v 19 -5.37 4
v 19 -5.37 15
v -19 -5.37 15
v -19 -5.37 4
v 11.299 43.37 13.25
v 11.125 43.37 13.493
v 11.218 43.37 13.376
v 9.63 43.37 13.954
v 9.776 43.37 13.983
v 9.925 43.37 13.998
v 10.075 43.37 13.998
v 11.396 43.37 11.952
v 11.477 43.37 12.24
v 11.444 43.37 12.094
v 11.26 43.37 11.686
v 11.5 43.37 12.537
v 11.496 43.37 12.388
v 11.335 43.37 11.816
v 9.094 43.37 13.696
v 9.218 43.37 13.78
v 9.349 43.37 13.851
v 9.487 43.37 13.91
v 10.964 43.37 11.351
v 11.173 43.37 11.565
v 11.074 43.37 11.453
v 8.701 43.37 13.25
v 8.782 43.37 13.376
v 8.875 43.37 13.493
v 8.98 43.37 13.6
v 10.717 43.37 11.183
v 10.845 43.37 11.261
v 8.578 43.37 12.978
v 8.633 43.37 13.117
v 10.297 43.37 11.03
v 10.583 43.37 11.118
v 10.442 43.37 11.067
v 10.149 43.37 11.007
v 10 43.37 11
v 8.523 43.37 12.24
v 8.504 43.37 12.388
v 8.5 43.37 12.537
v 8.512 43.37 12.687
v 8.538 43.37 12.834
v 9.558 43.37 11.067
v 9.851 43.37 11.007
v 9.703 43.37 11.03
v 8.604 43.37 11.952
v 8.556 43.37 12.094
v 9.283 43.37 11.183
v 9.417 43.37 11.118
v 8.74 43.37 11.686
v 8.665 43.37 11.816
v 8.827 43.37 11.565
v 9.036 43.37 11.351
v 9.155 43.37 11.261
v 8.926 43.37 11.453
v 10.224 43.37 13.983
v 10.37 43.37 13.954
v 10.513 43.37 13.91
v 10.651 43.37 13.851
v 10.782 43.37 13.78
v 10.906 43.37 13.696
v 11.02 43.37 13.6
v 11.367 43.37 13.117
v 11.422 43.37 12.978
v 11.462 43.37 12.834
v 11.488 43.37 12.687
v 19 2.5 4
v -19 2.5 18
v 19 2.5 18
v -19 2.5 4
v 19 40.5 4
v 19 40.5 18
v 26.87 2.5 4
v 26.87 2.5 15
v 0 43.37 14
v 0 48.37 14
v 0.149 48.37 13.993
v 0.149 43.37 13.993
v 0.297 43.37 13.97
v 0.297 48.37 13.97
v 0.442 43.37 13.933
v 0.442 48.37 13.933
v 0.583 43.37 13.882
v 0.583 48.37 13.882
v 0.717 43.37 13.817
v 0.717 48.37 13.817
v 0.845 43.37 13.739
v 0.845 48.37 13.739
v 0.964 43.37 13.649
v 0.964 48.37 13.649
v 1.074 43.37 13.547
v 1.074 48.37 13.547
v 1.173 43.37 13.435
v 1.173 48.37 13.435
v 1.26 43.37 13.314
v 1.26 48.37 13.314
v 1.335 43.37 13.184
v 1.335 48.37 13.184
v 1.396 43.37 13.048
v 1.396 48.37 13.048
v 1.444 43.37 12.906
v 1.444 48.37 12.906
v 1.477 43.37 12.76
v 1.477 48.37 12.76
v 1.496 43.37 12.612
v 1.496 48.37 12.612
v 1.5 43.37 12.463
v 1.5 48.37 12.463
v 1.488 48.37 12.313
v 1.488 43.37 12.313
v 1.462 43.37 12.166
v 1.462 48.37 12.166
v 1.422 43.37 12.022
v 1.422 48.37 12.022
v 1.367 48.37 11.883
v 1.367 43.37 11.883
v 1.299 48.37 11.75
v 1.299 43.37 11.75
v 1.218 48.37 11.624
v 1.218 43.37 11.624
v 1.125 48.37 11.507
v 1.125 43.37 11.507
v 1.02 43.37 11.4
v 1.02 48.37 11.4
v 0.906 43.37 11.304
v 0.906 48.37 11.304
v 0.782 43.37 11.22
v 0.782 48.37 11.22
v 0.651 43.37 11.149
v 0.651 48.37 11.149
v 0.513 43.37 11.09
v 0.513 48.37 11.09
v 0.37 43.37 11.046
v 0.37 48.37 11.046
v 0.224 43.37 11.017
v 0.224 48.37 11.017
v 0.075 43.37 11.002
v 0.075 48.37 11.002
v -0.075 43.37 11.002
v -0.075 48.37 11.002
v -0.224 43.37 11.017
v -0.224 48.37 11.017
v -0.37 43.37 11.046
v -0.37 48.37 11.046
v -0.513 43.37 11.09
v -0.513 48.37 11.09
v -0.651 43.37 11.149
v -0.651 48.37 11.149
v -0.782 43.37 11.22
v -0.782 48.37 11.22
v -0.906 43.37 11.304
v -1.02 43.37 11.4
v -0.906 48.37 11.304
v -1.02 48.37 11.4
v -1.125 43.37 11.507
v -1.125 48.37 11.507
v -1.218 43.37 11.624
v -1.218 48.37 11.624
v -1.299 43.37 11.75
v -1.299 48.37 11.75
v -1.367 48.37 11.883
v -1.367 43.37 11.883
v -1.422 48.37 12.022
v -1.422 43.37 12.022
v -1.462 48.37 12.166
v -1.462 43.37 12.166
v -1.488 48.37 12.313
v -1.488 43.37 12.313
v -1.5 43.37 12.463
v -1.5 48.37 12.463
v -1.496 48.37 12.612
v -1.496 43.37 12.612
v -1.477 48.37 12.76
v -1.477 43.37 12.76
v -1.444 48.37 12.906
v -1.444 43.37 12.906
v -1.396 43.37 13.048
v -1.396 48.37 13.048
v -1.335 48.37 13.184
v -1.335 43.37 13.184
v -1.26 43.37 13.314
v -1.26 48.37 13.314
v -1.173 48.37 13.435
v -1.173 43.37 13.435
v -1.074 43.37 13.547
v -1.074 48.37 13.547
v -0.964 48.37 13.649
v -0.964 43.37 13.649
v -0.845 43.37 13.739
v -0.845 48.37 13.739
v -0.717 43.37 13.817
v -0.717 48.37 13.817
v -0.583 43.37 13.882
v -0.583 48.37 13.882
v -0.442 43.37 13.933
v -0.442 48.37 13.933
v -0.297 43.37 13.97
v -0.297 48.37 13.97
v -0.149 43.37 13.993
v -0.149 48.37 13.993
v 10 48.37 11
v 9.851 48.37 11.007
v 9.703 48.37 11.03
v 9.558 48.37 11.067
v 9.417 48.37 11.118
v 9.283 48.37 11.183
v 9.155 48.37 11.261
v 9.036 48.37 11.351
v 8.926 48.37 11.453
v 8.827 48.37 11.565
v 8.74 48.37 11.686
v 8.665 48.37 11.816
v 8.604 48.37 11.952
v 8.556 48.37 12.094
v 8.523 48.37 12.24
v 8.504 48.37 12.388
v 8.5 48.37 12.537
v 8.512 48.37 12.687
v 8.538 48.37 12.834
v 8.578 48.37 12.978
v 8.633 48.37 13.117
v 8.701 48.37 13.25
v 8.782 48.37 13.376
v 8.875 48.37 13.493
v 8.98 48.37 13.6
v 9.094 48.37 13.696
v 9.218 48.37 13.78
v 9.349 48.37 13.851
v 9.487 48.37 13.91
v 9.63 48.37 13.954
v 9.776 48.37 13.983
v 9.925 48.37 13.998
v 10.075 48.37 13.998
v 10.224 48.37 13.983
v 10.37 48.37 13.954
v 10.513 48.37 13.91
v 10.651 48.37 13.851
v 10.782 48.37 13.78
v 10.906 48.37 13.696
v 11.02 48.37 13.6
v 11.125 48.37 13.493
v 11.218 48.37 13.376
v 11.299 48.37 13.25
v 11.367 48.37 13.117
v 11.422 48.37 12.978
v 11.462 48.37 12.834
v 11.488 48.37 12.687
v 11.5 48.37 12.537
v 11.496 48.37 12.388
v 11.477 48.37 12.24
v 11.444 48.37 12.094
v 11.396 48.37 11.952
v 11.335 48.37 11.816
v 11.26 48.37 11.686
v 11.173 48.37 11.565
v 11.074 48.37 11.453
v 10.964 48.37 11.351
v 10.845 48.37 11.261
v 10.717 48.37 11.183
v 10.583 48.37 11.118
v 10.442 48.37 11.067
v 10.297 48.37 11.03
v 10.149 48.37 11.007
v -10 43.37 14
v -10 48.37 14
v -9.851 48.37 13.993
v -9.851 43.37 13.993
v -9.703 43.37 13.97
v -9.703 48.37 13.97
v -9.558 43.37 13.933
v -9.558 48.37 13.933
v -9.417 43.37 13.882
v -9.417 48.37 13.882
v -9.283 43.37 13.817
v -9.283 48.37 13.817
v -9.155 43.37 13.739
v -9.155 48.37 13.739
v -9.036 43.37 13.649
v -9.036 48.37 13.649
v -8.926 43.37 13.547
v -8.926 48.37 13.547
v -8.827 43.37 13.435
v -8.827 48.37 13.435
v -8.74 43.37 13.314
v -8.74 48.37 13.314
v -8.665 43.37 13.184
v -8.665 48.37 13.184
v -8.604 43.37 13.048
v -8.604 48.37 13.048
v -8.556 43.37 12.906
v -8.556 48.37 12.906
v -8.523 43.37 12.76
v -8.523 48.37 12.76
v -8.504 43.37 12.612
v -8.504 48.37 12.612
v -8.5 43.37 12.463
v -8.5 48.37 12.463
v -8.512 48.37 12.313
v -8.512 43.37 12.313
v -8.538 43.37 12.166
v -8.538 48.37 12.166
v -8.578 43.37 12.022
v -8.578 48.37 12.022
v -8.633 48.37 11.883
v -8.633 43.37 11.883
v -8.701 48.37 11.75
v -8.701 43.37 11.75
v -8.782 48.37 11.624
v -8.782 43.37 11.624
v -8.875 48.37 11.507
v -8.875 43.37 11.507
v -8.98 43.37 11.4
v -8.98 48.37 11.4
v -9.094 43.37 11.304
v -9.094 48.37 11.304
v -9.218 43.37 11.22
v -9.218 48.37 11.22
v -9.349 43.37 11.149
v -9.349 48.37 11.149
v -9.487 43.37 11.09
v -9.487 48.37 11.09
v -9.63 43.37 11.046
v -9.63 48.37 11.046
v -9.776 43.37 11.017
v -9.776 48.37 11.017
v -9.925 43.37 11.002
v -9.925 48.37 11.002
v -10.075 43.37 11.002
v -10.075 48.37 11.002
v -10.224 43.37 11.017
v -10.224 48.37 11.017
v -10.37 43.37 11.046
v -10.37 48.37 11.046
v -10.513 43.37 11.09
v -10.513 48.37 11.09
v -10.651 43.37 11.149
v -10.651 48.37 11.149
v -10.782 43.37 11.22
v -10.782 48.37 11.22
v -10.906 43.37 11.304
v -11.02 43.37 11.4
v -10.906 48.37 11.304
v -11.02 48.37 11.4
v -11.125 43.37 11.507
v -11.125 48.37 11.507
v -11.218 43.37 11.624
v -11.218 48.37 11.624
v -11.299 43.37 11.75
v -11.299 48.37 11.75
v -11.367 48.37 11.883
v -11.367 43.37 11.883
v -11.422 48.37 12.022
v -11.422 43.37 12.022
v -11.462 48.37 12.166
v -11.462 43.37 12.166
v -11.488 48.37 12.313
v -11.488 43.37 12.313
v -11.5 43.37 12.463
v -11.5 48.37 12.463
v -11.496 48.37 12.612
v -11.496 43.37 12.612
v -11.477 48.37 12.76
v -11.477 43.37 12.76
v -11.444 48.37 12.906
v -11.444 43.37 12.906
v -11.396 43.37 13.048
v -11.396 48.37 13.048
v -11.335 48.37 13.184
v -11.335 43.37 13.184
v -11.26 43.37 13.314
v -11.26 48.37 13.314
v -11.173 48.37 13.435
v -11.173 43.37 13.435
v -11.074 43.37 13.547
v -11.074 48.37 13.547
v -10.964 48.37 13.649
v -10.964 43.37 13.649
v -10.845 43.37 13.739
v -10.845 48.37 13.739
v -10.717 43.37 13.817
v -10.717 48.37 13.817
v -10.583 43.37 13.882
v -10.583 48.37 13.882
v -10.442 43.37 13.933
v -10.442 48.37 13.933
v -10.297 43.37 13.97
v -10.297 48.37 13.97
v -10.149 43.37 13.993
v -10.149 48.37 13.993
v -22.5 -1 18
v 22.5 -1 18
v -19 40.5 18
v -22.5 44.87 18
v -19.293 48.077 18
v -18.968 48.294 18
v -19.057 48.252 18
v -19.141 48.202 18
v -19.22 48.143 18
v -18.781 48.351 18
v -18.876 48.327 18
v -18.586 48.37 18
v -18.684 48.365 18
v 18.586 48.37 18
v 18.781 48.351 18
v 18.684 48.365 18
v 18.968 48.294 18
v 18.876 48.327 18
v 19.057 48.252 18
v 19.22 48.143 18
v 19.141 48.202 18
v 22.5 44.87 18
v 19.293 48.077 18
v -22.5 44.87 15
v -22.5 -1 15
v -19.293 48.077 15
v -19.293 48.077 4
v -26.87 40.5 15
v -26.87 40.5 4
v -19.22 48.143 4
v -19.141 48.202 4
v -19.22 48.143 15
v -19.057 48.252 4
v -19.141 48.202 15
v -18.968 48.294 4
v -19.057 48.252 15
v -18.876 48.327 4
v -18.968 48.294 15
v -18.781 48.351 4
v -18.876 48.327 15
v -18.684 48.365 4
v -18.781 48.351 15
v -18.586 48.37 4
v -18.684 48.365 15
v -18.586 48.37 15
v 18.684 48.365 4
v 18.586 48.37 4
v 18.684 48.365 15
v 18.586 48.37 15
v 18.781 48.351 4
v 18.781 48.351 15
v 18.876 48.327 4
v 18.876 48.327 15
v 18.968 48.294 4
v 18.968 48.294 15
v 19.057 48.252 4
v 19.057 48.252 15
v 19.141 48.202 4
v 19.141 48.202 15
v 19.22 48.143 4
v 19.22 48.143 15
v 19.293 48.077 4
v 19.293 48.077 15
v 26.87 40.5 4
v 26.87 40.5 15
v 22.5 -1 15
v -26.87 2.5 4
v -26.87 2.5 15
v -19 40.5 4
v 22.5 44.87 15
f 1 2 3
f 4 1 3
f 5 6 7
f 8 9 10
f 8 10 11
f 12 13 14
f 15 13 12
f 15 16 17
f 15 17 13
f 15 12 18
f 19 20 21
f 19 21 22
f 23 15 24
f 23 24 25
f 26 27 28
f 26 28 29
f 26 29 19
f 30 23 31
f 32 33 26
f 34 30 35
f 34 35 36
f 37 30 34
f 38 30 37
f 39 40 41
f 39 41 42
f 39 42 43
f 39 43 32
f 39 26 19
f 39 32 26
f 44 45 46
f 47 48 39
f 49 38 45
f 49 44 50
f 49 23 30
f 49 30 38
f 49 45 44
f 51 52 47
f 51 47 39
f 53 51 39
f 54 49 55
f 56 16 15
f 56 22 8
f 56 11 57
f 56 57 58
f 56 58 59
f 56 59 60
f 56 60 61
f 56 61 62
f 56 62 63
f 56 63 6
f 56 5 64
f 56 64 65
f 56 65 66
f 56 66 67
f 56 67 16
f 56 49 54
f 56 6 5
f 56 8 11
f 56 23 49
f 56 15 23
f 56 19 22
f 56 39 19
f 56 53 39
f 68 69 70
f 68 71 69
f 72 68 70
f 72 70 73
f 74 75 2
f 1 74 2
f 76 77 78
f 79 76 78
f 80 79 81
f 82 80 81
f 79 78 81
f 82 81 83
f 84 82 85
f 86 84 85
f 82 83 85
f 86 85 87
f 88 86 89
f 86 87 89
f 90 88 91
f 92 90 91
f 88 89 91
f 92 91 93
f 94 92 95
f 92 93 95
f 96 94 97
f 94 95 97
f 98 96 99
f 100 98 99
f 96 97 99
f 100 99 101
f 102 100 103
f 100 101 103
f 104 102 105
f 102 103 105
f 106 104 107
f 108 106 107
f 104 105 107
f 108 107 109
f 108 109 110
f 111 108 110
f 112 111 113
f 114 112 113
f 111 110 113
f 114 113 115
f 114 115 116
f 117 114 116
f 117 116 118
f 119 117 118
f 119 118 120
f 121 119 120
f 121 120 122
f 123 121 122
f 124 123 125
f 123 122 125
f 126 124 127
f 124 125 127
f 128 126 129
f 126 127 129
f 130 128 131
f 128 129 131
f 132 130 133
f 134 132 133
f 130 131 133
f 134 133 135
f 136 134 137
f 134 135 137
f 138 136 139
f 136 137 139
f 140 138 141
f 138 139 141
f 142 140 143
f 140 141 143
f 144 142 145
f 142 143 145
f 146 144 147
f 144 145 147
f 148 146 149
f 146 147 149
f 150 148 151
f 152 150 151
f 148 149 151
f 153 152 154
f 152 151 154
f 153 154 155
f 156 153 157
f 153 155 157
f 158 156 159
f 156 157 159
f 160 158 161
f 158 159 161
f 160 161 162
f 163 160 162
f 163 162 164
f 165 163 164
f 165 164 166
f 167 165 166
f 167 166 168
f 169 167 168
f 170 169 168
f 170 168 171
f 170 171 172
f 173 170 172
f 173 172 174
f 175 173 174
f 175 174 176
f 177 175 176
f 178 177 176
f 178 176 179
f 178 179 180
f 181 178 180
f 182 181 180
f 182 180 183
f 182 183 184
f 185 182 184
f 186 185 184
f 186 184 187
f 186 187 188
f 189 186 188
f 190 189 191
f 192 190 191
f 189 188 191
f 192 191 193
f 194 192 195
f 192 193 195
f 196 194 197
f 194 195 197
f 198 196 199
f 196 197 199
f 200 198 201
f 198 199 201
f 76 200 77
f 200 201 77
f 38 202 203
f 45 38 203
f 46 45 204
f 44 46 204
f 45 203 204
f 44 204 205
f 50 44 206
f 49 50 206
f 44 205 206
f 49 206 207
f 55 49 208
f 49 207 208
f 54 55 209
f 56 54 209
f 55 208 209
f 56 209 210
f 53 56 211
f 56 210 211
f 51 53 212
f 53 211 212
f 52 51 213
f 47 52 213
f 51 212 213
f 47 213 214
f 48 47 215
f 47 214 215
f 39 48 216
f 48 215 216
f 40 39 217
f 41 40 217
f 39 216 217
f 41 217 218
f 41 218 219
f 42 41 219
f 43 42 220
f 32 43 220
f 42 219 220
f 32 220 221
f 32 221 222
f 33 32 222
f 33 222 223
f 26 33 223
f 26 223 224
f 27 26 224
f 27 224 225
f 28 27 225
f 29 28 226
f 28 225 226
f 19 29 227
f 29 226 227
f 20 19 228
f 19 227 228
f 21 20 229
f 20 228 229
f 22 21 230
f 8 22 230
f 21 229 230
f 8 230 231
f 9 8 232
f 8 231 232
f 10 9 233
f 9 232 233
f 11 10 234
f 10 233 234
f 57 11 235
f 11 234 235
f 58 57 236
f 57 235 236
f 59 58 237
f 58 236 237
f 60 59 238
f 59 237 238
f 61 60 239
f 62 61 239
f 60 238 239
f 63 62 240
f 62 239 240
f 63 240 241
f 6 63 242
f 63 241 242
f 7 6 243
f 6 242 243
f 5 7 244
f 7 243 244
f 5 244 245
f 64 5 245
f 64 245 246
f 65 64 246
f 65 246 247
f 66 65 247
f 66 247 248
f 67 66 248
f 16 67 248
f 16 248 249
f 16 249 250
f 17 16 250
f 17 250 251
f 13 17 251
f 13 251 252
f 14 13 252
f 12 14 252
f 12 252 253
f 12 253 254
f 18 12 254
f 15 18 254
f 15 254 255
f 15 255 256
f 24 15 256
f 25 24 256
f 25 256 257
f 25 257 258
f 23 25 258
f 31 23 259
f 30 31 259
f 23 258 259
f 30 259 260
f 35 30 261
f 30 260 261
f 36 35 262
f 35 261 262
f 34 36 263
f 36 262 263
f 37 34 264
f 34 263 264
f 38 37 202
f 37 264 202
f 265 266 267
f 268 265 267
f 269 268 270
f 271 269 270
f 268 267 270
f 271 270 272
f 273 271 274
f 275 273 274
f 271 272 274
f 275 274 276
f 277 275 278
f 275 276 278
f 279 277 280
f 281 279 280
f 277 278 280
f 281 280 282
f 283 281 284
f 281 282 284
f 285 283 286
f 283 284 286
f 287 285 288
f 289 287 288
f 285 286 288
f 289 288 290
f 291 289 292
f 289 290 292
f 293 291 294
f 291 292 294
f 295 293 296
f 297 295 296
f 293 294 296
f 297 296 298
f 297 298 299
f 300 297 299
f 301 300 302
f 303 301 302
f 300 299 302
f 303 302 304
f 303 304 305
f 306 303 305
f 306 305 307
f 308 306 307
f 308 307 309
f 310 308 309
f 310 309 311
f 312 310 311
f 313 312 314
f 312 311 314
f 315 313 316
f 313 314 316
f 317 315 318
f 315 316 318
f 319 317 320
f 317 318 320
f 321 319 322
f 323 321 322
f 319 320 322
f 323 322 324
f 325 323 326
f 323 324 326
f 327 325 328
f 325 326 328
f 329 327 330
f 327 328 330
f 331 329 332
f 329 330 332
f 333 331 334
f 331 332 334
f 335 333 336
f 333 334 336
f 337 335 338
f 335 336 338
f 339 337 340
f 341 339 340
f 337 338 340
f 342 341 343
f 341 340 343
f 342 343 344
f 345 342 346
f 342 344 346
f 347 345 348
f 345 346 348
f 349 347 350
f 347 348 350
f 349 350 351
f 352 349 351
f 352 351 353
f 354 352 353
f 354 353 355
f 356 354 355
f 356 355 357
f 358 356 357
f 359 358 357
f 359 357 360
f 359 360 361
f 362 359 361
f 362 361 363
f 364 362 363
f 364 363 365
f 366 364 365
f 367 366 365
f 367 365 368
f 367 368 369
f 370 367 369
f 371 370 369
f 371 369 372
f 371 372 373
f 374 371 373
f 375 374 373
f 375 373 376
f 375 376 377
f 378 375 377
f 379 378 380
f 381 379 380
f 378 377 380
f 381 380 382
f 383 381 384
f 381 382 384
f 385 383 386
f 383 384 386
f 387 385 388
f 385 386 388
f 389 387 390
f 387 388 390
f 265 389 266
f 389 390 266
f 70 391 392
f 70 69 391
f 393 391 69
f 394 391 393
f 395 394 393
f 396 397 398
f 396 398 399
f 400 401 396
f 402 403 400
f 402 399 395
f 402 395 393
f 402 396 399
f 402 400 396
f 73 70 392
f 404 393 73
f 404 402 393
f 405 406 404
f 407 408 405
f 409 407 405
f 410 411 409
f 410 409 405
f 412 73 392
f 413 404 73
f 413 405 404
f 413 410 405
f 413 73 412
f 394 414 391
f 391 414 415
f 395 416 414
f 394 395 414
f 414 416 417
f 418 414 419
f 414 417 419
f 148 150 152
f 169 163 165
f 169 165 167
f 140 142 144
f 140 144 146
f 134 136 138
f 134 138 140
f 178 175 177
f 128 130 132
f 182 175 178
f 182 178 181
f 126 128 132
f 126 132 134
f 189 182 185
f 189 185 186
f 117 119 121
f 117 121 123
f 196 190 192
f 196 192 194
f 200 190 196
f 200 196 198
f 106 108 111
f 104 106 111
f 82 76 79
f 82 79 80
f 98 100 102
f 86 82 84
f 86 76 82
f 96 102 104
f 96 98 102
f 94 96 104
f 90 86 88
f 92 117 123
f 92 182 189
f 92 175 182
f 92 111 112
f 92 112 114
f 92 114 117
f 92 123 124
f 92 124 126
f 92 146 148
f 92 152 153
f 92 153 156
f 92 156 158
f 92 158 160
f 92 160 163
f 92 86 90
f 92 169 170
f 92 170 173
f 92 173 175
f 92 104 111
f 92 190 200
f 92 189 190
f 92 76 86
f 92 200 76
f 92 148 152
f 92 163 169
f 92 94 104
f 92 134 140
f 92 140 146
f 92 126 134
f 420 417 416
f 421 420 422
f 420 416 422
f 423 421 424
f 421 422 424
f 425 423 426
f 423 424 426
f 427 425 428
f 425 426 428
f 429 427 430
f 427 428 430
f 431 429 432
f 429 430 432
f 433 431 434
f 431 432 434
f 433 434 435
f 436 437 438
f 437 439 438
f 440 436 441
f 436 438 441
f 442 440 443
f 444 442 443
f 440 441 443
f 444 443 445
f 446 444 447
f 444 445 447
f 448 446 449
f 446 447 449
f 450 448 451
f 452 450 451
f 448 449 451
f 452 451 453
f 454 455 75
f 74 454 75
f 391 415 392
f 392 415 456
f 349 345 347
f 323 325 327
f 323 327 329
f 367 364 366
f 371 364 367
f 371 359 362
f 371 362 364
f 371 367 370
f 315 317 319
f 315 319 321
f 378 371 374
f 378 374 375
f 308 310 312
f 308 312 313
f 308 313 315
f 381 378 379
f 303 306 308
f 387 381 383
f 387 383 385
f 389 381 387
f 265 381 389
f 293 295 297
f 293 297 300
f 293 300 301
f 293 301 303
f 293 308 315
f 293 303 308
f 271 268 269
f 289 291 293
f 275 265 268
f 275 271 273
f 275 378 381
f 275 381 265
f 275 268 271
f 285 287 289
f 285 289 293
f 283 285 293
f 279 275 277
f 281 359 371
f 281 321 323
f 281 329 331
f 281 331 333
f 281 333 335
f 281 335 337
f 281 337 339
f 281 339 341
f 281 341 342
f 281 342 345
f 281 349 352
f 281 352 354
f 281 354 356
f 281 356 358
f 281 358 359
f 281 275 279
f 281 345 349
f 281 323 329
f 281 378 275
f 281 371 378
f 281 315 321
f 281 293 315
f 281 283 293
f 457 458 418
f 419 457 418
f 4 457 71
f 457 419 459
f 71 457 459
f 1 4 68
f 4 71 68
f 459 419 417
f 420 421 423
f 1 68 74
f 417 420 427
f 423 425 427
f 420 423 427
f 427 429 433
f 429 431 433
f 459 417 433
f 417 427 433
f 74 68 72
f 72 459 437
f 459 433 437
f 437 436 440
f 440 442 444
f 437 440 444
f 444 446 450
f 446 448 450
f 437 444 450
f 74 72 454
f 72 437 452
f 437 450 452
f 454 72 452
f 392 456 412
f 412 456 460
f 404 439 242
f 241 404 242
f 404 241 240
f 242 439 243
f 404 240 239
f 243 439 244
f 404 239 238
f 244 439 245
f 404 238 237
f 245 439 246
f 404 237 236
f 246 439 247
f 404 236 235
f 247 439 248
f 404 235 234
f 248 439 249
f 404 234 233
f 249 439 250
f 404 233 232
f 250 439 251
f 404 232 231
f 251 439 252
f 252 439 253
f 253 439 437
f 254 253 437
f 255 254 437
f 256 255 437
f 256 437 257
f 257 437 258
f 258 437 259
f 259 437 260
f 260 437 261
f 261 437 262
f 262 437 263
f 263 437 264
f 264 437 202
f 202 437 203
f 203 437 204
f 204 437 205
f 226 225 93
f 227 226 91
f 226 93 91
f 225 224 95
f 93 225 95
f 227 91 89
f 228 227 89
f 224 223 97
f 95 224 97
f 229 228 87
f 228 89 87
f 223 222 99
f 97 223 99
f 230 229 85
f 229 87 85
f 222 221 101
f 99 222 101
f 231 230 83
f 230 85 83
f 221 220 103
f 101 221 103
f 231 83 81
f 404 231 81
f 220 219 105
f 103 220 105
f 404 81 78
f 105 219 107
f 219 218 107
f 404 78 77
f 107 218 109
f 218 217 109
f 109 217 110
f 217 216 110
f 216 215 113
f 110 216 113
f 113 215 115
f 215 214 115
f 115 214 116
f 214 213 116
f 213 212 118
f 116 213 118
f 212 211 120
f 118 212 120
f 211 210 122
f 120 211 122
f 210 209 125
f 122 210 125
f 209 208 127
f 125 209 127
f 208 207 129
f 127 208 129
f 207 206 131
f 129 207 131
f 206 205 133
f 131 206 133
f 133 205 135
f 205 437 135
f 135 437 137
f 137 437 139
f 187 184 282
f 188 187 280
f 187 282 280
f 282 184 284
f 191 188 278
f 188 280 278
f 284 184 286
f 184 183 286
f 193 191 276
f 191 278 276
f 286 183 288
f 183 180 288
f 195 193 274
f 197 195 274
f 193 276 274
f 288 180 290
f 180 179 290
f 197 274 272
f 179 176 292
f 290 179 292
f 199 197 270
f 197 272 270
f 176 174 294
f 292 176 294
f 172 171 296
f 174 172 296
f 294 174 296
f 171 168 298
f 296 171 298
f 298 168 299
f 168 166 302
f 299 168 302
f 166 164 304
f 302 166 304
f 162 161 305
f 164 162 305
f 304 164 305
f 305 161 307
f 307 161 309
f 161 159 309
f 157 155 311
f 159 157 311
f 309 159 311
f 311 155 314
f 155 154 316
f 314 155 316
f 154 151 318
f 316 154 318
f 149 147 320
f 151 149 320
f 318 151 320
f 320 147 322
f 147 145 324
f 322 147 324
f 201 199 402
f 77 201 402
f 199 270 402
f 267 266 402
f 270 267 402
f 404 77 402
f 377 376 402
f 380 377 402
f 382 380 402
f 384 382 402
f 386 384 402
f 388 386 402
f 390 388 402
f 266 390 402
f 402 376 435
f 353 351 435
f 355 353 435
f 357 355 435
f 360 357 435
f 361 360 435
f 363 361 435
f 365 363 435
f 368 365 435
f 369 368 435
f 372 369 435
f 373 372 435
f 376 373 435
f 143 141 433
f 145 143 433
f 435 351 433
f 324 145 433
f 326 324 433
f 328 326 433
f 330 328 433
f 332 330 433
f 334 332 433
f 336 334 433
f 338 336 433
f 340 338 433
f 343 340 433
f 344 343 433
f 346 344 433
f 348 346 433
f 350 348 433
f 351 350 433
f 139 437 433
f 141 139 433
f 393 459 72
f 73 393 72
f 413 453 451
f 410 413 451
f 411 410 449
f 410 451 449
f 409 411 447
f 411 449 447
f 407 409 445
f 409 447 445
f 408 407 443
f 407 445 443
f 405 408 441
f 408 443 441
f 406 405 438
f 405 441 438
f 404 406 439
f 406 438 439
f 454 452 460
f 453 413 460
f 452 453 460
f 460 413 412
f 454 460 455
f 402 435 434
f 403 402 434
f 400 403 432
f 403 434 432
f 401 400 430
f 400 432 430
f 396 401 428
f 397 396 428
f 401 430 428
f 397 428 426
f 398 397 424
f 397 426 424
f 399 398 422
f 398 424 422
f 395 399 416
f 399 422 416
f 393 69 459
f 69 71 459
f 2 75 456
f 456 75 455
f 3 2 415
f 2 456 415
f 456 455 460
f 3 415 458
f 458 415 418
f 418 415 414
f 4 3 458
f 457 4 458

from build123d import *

# Parameters (mm, degrees)
CROQUIS3_W                   = 38
CROQUIS3_H                   = 38
SALIENTE_EXTRUIR9_DEPTH      = 1
SALIENTE_EXTRUIR10_START     = -11
SALIENTE_EXTRUIR10_OUTLINE_W = 38
SALIENTE_EXTRUIR10_OUTLINE_H = 38
SALIENTE_EXTRUIR10_DEPTH     = 10
REDONDEO3_R                  = 1
CROQUIS13_W                  = 38
CROQUIS13_H                  = 38
SALIENTE_EXTRUIR15_DEPTH     = 3
CROQUIS15_R                  = 1.5
CORTAR_EXTRUIR5_DEPTH        = 5


# Read off the part's stored shape, not the designer's step: Saliente-Extruir10
with BuildPart() as part:
    # Croquis3 → Saliente-Extruir9 (new body)
    with BuildSketch(Plane.XY.offset(5)):
        Polygon((19, -5.370057685), (26.870057685, 2.5), (26.870057685, 40.5), (19, 48.370057685), (-19, 48.370057685), (-26.870057685, 40.5), (-26.870057685, 2.5), (-19, -5.370057685), align=None)
        with Locations((0, 21.5)):
            Rectangle(CROQUIS3_W, CROQUIS3_H, mode=Mode.SUBTRACT)
    extrude(amount=-SALIENTE_EXTRUIR9_DEPTH)

    # Saliente-Extruir10 outline → Saliente-Extruir10 (add)
    with BuildSketch(Plane(origin=(0, 0, 4), x_dir=(-1, 0, 0), z_dir=(0, 0, -1)).offset(SALIENTE_EXTRUIR10_START)):
        Polygon((-26.870057685, 2.5), (-19, -5.370057685), (19, -5.370057685), (26.870057685, 2.5), (26.870057685, 40.5), (19, 48.370057685), (-19, 48.370057685), (-26.870057685, 40.5), align=None)
        with Locations((0, 21.5)):
            Rectangle(SALIENTE_EXTRUIR10_OUTLINE_W, SALIENTE_EXTRUIR10_OUTLINE_H, mode=Mode.SUBTRACT)
    extrude(amount=SALIENTE_EXTRUIR10_DEPTH)

    # Redondeo3
    redondeo3_edges = [part.edges().sort_by_distance(p)[0] for p in [
        (-19, 48.370057685, 10),
        (19, 48.370057685, 10),
    ]]
    fillet(redondeo3_edges, radius=REDONDEO3_R)

    # Croquis13 → Saliente-Extruir15 (add)
    with BuildSketch(Plane.XY.offset(15)):
        with BuildLine():
            Line((-22.5, 44.870057685), (-22.5, -1))
            Line((-22.5, -1), (22.5, -1))
            Line((22.5, -1), (22.5, 44.870057685))
            Line((22.5, 44.870057685), (19.292893219, 48.077164466))
            ThreePointArc((19.292893219, 48.077164466), (18.96846987, 48.293937218), (18.585786438, 48.370057685))
            Line((18.585786438, 48.370057685), (-18.585786438, 48.370057685))
            ThreePointArc((-18.585786438, 48.370057685), (-18.96846987, 48.293937218), (-19.292893219, 48.077164466))
            Line((-19.292893219, 48.077164466), (-22.5, 44.870057685))
        make_face()
        with Locations((0, 21.5)):
            Rectangle(CROQUIS13_W, CROQUIS13_H, mode=Mode.SUBTRACT)
    extrude(amount=SALIENTE_EXTRUIR15_DEPTH)

    # Croquis15 → Cortar-Extruir5 (cut)
    with BuildSketch(Plane(origin=(0, 48.370057685, 0), x_dir=(1, 0, 0), z_dir=(0, 1, 0))):
        with Locations(Location((0, -12.5, 0), (0, 0, 270))):
            Circle(CROQUIS15_R)
        with Locations(Location((-10, -12.5, 0), (0, 0, 270))):
            Circle(CROQUIS15_R)
        with Locations(Location((10, -12.5, 0), (0, 0, 90))):
            Circle(CROQUIS15_R)
    extrude(amount=-CORTAR_EXTRUIR5_DEPTH, mode=Mode.SUBTRACT)


solid = part.part
